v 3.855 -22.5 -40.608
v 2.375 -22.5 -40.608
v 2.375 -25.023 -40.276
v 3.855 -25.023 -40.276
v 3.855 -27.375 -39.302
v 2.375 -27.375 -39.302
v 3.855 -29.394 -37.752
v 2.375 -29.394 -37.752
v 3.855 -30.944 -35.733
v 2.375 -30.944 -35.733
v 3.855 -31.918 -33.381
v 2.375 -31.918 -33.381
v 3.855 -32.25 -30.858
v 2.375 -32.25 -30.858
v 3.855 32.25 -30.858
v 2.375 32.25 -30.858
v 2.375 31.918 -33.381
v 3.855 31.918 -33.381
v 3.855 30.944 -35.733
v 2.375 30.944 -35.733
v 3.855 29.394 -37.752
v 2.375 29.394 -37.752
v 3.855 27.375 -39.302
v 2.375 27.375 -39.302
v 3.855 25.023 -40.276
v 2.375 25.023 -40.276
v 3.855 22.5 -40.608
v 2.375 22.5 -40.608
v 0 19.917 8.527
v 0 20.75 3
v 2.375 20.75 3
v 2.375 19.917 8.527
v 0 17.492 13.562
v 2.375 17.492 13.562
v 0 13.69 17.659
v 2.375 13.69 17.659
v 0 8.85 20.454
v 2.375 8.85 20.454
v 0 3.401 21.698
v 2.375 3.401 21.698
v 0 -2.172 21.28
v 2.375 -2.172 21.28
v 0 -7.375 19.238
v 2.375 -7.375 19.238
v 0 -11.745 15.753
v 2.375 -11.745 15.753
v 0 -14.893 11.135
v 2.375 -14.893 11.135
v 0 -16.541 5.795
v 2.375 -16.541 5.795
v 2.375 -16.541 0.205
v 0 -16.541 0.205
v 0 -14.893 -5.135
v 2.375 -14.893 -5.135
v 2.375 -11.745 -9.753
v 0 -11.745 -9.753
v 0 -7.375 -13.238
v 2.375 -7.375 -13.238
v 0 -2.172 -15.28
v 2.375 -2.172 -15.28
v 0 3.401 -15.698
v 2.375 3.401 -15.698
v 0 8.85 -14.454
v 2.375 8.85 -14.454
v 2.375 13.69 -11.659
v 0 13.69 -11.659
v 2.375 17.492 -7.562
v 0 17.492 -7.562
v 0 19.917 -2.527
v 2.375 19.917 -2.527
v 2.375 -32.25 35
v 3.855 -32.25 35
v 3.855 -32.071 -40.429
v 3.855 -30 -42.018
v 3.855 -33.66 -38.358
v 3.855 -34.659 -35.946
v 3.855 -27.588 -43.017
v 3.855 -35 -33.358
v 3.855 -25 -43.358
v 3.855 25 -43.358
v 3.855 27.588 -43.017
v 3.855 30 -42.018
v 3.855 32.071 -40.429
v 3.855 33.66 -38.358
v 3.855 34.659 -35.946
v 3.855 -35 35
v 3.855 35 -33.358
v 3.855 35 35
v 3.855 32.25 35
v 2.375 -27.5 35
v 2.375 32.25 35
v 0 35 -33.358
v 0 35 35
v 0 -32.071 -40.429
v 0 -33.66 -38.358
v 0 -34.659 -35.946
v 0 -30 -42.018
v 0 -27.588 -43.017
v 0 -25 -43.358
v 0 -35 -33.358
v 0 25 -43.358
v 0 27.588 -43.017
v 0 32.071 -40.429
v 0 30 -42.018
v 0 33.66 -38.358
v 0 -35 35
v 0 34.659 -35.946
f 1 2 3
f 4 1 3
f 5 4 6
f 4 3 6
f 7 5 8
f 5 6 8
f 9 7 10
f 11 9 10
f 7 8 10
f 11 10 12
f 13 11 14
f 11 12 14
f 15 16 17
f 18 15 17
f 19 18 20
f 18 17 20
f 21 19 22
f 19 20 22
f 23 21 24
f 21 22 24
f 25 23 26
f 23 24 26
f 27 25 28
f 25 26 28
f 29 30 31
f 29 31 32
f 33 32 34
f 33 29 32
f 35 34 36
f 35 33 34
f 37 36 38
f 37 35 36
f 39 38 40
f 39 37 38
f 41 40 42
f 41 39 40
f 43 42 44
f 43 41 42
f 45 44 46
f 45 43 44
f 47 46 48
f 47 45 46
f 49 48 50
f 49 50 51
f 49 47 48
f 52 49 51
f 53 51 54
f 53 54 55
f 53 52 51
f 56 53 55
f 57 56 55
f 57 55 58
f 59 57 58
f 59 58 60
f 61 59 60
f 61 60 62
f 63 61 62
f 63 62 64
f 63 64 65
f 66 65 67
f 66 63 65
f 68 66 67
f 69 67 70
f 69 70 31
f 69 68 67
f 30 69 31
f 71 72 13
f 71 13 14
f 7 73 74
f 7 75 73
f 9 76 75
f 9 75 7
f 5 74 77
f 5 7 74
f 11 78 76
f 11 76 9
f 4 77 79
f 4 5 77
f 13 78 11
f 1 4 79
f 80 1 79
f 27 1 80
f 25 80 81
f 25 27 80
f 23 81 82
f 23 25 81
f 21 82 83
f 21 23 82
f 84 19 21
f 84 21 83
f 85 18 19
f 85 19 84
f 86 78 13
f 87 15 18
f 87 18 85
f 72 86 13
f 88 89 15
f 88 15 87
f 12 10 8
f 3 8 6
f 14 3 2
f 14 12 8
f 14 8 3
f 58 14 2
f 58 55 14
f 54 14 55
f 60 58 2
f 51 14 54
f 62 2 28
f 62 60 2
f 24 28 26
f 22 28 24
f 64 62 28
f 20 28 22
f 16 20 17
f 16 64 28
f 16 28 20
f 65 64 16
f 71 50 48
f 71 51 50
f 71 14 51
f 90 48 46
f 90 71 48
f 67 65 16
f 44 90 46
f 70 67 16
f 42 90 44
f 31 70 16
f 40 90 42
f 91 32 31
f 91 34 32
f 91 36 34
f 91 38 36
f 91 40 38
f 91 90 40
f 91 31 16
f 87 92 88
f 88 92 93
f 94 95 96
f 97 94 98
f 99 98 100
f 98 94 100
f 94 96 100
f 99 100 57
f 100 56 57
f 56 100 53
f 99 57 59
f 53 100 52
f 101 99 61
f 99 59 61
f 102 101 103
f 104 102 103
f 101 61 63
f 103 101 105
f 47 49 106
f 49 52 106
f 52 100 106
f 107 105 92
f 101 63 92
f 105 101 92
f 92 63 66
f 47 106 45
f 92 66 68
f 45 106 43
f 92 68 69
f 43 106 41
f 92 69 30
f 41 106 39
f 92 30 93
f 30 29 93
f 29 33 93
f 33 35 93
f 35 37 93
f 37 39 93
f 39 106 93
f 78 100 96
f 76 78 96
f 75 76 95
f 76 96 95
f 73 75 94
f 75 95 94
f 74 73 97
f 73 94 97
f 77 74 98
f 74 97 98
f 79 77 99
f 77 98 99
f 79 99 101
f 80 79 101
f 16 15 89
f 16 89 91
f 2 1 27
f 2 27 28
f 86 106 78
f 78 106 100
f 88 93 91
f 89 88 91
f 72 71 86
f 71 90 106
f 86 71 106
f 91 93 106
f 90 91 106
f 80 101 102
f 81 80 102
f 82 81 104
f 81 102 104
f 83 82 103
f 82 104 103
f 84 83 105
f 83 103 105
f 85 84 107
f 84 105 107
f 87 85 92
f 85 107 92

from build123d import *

# Parameters (mm, degrees)
F1_DEPTH  = 7.5
F2_W      = 2.6
F2_H      = 4.75
F0_R      = 18.75
F4_DEPTH  = 2.375
F8_R      = 4
F9_W      = 29.1621480137
F9_H      = 87.7830125391
F9_W_2    = 6.8209778983
F10_DEPTH = 60.1


# Not quite as in the source:
# - a feature names something its author has since deleted; it is built from what else it names


with BuildPart() as f1:
    # F0 (on Right) → F1 (new body)
    with BuildSketch(Plane.YZ):
        with BuildLine():
            Line((-27.5, -30.8578620553), (-27.5, 35))
            Line((-27.5, 35), (-35, 35))
            Line((-35, 35), (-35, -33.3578620553))
            ThreePointArc((-35, -33.3578620553), (-32.0710678119, -40.4289298672), (-25, -43.3578620553))
            Line((-25, -43.3578620553), (25, -43.3578620553))
            ThreePointArc((25, -43.3578620553), (32.0710678119, -40.4289298672), (35, -33.3578620553))
            Line((35, -33.3578620553), (35, 35))
            Line((35, 35), (27.5, 35))
            Line((27.5, 35), (27.5, -30.8578620553))
            ThreePointArc((27.5, -30.8578620553), (26.0355339059, -34.3933959612), (22.5, -35.8578620553))
            Line((22.5, -35.8578620553), (-22.5, -35.8578620553))
            ThreePointArc((-22.5, -35.8578620553), (-26.0355339059, -34.3933959612), (-27.5, -30.8578620553))
        make_face()
    extrude(amount=F1_DEPTH)

    # F3: sweep along a path in F0
    with BuildLine(Plane.YZ) as f3_path:
        Line((27.5, 35), (27.5, -30.8578620553))
        ThreePointArc((27.5, -30.8578620553), (26.0355339059, -34.3933959612), (22.5, -35.8578620553))
        Line((22.5, -35.8578620553), (-22.5, -35.8578620553))
        ThreePointArc((-22.5, -35.8578620553), (-26.0355339059, -34.3933959612), (-27.5, -30.8578620553))
        Line((-27.5, -30.8578620553), (-27.5, 35))
    # F2 (on face) → F3 (sweep, cut)
    with BuildSketch(Plane.XY.offset(35)):
        with Locations((3.675, 29.875)):
            Rectangle(F2_W, F2_H)
    sweep(path=f3_path.line, mode=Mode.SUBTRACT)

    # F0 (on Right) → F4 (join)
    with BuildSketch(Plane.YZ):
        with BuildLine():
            Line((27.5, 35), (-27.5, 35))
            Line((-27.5, 35), (-27.5, -30.8578620553))
            ThreePointArc((-27.5, -30.8578620553), (-26.0355339059, -34.3933959612), (-22.5, -35.8578620553))
            Line((-22.5, -35.8578620553), (22.5, -35.8578620553))
            ThreePointArc((22.5, -35.8578620553), (26.0355339059, -34.3933959612), (27.5, -30.8578620553))
            Line((27.5, -30.8578620553), (27.5, 35))
        make_face()
        with Locations((2, 3)):
            Circle(F0_R, mode=Mode.SUBTRACT)
    extrude(amount=F4_DEPTH)

    # F6 (on offset) → F7 (revolve)
    with BuildSketch(Plane.XY.offset(1)):
        Polygon((0, 22), (0, 25), (-22.6, 35), (-22.6, 32), align=None)
    revolve(axis=Axis((0, 2, 3), (1, 0, 0)))

    # F8
    f8_edges = [f1.edges().sort_by_distance(p)[0] for p in [
        (6.2375, -27.5, 35),
        (6.2375, 27.5, 35),
    ]]
    fillet(f8_edges, radius=F8_R)

    # F9 (on offset) → F10 (cut, symmetric)
    with BuildSketch(Plane.XY.offset(1)):
        with Locations((-14.5810740069, 1.1862572283)):
            Rectangle(F9_W, F9_H)
        with Locations((7.2658261051, 1.1862572283)):
            Rectangle(F9_W_2, F9_H)
    extrude(amount=F10_DEPTH, both=True, mode=Mode.SUBTRACT)


solid = f1.part
